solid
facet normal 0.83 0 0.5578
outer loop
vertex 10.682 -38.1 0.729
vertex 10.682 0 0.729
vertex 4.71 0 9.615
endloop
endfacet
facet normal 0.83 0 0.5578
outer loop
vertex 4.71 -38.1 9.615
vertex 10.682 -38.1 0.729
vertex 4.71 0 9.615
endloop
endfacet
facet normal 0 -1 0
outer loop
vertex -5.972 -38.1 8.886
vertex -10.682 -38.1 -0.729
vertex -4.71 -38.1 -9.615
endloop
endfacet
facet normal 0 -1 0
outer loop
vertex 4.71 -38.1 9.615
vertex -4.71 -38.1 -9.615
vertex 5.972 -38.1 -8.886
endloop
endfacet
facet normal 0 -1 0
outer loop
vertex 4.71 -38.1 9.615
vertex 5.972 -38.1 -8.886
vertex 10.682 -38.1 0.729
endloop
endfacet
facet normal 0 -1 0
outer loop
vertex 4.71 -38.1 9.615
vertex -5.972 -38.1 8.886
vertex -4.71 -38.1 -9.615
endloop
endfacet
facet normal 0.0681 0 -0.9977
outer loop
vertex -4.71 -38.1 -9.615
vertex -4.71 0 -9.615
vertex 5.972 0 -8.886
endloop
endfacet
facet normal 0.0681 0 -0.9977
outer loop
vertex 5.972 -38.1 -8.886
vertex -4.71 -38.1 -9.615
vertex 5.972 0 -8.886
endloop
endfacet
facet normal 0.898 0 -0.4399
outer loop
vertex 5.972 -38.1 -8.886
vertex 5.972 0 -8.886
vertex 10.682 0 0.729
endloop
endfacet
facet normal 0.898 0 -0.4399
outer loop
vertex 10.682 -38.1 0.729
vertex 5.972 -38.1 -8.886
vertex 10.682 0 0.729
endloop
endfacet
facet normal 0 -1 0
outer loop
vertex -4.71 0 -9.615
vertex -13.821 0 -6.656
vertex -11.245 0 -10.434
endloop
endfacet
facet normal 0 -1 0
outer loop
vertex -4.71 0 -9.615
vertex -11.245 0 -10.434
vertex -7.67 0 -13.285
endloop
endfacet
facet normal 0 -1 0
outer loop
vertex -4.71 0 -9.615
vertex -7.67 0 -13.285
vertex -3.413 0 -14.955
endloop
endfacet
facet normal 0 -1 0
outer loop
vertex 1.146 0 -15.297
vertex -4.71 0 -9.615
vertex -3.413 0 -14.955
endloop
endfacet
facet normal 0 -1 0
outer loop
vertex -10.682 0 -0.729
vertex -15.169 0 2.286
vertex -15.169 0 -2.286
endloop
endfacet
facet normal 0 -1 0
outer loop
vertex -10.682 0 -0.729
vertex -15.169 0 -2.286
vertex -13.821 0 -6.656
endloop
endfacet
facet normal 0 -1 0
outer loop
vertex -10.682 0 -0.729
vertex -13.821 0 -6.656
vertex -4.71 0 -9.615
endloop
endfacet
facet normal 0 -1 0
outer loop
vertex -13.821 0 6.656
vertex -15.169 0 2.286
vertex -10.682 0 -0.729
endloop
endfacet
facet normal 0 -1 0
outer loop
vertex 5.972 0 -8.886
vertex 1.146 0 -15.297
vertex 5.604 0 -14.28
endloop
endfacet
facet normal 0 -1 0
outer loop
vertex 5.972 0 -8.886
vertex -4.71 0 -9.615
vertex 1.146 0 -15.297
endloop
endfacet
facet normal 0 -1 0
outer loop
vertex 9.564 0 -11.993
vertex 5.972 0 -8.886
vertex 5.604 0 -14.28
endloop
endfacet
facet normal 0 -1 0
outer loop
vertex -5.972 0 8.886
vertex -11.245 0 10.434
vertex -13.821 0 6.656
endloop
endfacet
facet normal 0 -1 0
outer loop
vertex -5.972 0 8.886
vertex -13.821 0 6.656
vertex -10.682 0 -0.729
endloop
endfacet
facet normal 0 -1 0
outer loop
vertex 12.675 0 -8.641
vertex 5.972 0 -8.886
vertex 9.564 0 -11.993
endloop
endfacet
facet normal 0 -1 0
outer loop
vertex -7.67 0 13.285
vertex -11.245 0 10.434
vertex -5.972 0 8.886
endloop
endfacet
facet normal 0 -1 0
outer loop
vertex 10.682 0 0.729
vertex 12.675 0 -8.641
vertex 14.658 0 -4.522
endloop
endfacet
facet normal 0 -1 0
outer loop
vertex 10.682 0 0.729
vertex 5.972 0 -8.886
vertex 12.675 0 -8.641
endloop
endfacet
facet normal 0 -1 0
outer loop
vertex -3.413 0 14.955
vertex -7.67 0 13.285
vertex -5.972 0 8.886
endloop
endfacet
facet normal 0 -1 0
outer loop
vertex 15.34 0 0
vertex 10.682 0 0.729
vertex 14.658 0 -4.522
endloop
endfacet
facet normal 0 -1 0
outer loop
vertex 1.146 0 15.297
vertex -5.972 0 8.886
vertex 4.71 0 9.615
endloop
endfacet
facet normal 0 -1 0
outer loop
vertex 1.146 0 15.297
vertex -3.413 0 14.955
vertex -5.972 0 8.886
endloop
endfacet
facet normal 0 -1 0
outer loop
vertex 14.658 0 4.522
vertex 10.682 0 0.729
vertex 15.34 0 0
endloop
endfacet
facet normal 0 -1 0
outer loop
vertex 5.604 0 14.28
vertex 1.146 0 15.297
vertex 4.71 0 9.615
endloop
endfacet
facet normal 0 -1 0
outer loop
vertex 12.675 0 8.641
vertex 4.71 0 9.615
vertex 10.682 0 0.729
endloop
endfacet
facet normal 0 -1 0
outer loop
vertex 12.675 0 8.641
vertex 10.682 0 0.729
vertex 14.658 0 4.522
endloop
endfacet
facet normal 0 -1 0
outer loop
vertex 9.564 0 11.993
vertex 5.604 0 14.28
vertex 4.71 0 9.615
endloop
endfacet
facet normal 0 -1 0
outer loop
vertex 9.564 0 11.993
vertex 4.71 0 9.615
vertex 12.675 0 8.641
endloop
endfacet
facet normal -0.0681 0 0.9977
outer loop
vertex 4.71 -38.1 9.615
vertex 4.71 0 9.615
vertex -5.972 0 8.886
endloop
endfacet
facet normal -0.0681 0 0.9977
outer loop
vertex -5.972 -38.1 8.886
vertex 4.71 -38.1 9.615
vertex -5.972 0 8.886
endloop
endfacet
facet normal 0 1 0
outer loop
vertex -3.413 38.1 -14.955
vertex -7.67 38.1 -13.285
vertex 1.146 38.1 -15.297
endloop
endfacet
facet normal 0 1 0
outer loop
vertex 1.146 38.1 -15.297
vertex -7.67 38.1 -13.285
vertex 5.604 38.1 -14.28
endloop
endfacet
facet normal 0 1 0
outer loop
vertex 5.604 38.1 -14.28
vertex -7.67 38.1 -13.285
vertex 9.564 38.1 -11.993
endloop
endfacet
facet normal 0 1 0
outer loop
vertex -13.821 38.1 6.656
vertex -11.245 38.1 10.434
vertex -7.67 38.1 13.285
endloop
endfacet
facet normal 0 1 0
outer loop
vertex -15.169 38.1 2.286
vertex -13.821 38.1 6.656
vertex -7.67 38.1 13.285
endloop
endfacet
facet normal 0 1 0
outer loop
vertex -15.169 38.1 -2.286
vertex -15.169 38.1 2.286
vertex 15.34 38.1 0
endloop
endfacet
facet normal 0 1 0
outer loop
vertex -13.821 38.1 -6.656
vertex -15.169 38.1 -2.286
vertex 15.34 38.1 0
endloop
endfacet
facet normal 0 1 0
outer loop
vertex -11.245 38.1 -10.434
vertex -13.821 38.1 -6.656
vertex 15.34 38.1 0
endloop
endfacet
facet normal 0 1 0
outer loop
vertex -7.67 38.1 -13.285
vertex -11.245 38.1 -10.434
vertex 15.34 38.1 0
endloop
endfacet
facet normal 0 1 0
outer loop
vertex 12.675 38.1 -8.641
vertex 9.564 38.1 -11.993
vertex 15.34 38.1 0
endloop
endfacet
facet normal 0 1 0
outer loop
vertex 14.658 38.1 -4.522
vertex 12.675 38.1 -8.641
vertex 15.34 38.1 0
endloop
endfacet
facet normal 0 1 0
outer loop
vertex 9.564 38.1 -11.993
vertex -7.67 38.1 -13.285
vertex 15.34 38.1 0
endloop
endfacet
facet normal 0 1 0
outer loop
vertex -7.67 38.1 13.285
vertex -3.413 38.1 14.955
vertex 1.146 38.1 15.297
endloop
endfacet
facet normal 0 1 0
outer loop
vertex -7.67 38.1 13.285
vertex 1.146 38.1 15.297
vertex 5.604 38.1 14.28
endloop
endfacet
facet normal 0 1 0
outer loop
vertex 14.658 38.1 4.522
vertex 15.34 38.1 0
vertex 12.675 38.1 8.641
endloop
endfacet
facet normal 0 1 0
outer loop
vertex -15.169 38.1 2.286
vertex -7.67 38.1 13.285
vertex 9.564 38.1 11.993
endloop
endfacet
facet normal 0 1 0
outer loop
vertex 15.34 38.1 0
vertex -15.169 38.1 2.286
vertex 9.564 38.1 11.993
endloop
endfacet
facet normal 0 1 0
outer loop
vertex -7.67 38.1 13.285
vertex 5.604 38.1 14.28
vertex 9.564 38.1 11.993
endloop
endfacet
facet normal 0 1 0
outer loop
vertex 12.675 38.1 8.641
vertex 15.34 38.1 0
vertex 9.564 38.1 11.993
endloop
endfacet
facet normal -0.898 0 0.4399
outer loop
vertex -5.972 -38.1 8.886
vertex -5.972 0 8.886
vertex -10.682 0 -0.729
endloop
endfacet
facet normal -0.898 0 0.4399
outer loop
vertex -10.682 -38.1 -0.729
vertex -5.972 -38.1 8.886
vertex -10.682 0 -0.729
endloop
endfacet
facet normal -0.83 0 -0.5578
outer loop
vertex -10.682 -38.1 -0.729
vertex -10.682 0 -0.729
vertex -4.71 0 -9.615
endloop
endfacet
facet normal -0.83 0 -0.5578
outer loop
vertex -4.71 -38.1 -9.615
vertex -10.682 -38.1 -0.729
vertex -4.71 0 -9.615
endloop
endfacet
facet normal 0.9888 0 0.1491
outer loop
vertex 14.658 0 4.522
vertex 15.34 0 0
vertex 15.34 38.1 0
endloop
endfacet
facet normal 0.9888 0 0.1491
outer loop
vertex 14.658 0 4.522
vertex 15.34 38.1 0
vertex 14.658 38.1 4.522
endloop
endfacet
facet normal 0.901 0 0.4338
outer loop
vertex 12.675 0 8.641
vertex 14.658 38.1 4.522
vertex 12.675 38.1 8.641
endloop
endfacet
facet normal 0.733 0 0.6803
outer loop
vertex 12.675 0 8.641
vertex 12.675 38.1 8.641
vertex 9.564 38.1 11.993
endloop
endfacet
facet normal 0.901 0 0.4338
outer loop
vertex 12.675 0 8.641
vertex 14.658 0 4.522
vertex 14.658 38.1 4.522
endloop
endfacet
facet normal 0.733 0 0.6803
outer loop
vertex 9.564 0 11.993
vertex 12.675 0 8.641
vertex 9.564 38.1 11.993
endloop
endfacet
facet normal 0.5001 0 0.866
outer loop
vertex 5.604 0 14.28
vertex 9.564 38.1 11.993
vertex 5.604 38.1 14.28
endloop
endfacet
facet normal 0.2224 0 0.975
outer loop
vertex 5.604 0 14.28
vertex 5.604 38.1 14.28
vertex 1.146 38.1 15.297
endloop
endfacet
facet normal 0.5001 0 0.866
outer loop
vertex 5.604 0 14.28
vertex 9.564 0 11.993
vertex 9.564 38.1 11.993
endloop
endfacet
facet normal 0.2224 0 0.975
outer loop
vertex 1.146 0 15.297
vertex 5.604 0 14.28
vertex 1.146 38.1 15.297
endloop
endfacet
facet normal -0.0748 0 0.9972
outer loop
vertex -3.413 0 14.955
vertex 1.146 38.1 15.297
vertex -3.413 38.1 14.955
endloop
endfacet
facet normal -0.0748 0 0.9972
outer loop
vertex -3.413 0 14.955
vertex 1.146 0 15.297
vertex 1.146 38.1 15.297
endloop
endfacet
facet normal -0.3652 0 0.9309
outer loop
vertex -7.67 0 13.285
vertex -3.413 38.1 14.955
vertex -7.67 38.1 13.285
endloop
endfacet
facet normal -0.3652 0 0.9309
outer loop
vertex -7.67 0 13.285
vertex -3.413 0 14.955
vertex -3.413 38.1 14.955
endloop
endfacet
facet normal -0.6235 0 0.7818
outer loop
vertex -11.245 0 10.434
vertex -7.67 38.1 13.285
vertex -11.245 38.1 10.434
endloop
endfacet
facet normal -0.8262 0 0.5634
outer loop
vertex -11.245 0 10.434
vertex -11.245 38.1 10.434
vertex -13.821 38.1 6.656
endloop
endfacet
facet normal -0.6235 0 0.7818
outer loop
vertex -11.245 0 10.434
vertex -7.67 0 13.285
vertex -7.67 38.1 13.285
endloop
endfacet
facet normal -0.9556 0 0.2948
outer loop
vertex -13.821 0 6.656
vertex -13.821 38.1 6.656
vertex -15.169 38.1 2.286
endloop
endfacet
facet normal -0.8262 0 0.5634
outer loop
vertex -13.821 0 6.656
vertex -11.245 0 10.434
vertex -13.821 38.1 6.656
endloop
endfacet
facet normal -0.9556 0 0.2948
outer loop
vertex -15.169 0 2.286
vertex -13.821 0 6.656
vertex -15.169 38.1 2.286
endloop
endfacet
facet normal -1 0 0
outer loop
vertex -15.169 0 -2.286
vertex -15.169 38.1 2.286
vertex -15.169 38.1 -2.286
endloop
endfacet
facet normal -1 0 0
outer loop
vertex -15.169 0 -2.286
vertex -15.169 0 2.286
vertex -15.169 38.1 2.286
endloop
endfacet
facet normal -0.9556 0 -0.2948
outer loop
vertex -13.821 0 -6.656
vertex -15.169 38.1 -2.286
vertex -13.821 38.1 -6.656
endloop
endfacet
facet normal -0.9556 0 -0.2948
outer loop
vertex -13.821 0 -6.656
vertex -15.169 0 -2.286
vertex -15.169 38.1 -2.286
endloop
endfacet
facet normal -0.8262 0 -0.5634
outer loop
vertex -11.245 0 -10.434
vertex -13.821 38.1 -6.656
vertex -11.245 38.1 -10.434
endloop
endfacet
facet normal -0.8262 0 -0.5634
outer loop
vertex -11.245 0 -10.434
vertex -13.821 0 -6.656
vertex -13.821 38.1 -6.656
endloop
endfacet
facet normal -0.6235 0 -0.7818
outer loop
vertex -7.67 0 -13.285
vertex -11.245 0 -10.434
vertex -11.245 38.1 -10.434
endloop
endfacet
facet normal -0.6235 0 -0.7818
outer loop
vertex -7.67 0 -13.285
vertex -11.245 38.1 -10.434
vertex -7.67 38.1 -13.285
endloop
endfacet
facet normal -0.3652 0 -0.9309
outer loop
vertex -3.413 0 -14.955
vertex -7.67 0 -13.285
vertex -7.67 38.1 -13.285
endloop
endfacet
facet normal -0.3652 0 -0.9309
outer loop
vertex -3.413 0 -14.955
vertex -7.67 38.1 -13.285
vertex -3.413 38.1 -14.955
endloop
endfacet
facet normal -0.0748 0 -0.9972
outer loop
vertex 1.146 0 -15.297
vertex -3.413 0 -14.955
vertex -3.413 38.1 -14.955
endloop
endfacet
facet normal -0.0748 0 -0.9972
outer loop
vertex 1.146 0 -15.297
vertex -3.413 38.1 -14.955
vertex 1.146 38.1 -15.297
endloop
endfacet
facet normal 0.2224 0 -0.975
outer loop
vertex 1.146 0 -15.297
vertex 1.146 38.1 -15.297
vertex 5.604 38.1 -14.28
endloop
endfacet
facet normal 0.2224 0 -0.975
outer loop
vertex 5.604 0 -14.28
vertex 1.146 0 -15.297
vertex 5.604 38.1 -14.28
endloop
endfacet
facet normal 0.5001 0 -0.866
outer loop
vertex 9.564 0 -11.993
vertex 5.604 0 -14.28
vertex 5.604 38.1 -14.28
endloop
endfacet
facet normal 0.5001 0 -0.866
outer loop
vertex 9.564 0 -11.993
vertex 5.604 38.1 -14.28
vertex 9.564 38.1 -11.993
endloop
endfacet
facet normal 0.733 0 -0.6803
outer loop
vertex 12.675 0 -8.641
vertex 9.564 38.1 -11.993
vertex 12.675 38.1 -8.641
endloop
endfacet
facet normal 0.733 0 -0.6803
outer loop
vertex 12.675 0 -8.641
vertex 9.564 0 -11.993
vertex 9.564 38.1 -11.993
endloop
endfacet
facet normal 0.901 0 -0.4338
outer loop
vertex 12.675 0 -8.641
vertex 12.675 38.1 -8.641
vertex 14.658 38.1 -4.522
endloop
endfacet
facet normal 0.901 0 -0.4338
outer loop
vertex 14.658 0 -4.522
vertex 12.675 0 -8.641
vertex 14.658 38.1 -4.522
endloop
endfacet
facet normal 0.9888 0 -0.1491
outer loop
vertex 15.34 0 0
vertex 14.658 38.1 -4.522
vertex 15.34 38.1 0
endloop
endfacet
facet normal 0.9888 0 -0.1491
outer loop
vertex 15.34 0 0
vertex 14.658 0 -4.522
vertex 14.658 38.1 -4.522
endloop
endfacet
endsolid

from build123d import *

# Parameters (mm, degrees)
F1_DEPTH = 38.1
F2_R     = 15.340009
F3_DEPTH = 38.1


with BuildPart() as f1:
    # F0 (on Front) → F1 (new body)
    with BuildSketch(Plane.XZ):
        Polygon((10.681883, 0.728829), (4.709757, 9.615196), (-5.972126, 8.886367), (-10.681883, -0.728829), (-4.709757, -9.615196), (5.972126, -8.886367), align=None)
    extrude(amount=F1_DEPTH)

    # F2 (on Front) → F3 (join)
    with BuildSketch(Plane.XZ):
        Circle(F2_R)
    extrude(amount=-F3_DEPTH)


solid = f1.part
